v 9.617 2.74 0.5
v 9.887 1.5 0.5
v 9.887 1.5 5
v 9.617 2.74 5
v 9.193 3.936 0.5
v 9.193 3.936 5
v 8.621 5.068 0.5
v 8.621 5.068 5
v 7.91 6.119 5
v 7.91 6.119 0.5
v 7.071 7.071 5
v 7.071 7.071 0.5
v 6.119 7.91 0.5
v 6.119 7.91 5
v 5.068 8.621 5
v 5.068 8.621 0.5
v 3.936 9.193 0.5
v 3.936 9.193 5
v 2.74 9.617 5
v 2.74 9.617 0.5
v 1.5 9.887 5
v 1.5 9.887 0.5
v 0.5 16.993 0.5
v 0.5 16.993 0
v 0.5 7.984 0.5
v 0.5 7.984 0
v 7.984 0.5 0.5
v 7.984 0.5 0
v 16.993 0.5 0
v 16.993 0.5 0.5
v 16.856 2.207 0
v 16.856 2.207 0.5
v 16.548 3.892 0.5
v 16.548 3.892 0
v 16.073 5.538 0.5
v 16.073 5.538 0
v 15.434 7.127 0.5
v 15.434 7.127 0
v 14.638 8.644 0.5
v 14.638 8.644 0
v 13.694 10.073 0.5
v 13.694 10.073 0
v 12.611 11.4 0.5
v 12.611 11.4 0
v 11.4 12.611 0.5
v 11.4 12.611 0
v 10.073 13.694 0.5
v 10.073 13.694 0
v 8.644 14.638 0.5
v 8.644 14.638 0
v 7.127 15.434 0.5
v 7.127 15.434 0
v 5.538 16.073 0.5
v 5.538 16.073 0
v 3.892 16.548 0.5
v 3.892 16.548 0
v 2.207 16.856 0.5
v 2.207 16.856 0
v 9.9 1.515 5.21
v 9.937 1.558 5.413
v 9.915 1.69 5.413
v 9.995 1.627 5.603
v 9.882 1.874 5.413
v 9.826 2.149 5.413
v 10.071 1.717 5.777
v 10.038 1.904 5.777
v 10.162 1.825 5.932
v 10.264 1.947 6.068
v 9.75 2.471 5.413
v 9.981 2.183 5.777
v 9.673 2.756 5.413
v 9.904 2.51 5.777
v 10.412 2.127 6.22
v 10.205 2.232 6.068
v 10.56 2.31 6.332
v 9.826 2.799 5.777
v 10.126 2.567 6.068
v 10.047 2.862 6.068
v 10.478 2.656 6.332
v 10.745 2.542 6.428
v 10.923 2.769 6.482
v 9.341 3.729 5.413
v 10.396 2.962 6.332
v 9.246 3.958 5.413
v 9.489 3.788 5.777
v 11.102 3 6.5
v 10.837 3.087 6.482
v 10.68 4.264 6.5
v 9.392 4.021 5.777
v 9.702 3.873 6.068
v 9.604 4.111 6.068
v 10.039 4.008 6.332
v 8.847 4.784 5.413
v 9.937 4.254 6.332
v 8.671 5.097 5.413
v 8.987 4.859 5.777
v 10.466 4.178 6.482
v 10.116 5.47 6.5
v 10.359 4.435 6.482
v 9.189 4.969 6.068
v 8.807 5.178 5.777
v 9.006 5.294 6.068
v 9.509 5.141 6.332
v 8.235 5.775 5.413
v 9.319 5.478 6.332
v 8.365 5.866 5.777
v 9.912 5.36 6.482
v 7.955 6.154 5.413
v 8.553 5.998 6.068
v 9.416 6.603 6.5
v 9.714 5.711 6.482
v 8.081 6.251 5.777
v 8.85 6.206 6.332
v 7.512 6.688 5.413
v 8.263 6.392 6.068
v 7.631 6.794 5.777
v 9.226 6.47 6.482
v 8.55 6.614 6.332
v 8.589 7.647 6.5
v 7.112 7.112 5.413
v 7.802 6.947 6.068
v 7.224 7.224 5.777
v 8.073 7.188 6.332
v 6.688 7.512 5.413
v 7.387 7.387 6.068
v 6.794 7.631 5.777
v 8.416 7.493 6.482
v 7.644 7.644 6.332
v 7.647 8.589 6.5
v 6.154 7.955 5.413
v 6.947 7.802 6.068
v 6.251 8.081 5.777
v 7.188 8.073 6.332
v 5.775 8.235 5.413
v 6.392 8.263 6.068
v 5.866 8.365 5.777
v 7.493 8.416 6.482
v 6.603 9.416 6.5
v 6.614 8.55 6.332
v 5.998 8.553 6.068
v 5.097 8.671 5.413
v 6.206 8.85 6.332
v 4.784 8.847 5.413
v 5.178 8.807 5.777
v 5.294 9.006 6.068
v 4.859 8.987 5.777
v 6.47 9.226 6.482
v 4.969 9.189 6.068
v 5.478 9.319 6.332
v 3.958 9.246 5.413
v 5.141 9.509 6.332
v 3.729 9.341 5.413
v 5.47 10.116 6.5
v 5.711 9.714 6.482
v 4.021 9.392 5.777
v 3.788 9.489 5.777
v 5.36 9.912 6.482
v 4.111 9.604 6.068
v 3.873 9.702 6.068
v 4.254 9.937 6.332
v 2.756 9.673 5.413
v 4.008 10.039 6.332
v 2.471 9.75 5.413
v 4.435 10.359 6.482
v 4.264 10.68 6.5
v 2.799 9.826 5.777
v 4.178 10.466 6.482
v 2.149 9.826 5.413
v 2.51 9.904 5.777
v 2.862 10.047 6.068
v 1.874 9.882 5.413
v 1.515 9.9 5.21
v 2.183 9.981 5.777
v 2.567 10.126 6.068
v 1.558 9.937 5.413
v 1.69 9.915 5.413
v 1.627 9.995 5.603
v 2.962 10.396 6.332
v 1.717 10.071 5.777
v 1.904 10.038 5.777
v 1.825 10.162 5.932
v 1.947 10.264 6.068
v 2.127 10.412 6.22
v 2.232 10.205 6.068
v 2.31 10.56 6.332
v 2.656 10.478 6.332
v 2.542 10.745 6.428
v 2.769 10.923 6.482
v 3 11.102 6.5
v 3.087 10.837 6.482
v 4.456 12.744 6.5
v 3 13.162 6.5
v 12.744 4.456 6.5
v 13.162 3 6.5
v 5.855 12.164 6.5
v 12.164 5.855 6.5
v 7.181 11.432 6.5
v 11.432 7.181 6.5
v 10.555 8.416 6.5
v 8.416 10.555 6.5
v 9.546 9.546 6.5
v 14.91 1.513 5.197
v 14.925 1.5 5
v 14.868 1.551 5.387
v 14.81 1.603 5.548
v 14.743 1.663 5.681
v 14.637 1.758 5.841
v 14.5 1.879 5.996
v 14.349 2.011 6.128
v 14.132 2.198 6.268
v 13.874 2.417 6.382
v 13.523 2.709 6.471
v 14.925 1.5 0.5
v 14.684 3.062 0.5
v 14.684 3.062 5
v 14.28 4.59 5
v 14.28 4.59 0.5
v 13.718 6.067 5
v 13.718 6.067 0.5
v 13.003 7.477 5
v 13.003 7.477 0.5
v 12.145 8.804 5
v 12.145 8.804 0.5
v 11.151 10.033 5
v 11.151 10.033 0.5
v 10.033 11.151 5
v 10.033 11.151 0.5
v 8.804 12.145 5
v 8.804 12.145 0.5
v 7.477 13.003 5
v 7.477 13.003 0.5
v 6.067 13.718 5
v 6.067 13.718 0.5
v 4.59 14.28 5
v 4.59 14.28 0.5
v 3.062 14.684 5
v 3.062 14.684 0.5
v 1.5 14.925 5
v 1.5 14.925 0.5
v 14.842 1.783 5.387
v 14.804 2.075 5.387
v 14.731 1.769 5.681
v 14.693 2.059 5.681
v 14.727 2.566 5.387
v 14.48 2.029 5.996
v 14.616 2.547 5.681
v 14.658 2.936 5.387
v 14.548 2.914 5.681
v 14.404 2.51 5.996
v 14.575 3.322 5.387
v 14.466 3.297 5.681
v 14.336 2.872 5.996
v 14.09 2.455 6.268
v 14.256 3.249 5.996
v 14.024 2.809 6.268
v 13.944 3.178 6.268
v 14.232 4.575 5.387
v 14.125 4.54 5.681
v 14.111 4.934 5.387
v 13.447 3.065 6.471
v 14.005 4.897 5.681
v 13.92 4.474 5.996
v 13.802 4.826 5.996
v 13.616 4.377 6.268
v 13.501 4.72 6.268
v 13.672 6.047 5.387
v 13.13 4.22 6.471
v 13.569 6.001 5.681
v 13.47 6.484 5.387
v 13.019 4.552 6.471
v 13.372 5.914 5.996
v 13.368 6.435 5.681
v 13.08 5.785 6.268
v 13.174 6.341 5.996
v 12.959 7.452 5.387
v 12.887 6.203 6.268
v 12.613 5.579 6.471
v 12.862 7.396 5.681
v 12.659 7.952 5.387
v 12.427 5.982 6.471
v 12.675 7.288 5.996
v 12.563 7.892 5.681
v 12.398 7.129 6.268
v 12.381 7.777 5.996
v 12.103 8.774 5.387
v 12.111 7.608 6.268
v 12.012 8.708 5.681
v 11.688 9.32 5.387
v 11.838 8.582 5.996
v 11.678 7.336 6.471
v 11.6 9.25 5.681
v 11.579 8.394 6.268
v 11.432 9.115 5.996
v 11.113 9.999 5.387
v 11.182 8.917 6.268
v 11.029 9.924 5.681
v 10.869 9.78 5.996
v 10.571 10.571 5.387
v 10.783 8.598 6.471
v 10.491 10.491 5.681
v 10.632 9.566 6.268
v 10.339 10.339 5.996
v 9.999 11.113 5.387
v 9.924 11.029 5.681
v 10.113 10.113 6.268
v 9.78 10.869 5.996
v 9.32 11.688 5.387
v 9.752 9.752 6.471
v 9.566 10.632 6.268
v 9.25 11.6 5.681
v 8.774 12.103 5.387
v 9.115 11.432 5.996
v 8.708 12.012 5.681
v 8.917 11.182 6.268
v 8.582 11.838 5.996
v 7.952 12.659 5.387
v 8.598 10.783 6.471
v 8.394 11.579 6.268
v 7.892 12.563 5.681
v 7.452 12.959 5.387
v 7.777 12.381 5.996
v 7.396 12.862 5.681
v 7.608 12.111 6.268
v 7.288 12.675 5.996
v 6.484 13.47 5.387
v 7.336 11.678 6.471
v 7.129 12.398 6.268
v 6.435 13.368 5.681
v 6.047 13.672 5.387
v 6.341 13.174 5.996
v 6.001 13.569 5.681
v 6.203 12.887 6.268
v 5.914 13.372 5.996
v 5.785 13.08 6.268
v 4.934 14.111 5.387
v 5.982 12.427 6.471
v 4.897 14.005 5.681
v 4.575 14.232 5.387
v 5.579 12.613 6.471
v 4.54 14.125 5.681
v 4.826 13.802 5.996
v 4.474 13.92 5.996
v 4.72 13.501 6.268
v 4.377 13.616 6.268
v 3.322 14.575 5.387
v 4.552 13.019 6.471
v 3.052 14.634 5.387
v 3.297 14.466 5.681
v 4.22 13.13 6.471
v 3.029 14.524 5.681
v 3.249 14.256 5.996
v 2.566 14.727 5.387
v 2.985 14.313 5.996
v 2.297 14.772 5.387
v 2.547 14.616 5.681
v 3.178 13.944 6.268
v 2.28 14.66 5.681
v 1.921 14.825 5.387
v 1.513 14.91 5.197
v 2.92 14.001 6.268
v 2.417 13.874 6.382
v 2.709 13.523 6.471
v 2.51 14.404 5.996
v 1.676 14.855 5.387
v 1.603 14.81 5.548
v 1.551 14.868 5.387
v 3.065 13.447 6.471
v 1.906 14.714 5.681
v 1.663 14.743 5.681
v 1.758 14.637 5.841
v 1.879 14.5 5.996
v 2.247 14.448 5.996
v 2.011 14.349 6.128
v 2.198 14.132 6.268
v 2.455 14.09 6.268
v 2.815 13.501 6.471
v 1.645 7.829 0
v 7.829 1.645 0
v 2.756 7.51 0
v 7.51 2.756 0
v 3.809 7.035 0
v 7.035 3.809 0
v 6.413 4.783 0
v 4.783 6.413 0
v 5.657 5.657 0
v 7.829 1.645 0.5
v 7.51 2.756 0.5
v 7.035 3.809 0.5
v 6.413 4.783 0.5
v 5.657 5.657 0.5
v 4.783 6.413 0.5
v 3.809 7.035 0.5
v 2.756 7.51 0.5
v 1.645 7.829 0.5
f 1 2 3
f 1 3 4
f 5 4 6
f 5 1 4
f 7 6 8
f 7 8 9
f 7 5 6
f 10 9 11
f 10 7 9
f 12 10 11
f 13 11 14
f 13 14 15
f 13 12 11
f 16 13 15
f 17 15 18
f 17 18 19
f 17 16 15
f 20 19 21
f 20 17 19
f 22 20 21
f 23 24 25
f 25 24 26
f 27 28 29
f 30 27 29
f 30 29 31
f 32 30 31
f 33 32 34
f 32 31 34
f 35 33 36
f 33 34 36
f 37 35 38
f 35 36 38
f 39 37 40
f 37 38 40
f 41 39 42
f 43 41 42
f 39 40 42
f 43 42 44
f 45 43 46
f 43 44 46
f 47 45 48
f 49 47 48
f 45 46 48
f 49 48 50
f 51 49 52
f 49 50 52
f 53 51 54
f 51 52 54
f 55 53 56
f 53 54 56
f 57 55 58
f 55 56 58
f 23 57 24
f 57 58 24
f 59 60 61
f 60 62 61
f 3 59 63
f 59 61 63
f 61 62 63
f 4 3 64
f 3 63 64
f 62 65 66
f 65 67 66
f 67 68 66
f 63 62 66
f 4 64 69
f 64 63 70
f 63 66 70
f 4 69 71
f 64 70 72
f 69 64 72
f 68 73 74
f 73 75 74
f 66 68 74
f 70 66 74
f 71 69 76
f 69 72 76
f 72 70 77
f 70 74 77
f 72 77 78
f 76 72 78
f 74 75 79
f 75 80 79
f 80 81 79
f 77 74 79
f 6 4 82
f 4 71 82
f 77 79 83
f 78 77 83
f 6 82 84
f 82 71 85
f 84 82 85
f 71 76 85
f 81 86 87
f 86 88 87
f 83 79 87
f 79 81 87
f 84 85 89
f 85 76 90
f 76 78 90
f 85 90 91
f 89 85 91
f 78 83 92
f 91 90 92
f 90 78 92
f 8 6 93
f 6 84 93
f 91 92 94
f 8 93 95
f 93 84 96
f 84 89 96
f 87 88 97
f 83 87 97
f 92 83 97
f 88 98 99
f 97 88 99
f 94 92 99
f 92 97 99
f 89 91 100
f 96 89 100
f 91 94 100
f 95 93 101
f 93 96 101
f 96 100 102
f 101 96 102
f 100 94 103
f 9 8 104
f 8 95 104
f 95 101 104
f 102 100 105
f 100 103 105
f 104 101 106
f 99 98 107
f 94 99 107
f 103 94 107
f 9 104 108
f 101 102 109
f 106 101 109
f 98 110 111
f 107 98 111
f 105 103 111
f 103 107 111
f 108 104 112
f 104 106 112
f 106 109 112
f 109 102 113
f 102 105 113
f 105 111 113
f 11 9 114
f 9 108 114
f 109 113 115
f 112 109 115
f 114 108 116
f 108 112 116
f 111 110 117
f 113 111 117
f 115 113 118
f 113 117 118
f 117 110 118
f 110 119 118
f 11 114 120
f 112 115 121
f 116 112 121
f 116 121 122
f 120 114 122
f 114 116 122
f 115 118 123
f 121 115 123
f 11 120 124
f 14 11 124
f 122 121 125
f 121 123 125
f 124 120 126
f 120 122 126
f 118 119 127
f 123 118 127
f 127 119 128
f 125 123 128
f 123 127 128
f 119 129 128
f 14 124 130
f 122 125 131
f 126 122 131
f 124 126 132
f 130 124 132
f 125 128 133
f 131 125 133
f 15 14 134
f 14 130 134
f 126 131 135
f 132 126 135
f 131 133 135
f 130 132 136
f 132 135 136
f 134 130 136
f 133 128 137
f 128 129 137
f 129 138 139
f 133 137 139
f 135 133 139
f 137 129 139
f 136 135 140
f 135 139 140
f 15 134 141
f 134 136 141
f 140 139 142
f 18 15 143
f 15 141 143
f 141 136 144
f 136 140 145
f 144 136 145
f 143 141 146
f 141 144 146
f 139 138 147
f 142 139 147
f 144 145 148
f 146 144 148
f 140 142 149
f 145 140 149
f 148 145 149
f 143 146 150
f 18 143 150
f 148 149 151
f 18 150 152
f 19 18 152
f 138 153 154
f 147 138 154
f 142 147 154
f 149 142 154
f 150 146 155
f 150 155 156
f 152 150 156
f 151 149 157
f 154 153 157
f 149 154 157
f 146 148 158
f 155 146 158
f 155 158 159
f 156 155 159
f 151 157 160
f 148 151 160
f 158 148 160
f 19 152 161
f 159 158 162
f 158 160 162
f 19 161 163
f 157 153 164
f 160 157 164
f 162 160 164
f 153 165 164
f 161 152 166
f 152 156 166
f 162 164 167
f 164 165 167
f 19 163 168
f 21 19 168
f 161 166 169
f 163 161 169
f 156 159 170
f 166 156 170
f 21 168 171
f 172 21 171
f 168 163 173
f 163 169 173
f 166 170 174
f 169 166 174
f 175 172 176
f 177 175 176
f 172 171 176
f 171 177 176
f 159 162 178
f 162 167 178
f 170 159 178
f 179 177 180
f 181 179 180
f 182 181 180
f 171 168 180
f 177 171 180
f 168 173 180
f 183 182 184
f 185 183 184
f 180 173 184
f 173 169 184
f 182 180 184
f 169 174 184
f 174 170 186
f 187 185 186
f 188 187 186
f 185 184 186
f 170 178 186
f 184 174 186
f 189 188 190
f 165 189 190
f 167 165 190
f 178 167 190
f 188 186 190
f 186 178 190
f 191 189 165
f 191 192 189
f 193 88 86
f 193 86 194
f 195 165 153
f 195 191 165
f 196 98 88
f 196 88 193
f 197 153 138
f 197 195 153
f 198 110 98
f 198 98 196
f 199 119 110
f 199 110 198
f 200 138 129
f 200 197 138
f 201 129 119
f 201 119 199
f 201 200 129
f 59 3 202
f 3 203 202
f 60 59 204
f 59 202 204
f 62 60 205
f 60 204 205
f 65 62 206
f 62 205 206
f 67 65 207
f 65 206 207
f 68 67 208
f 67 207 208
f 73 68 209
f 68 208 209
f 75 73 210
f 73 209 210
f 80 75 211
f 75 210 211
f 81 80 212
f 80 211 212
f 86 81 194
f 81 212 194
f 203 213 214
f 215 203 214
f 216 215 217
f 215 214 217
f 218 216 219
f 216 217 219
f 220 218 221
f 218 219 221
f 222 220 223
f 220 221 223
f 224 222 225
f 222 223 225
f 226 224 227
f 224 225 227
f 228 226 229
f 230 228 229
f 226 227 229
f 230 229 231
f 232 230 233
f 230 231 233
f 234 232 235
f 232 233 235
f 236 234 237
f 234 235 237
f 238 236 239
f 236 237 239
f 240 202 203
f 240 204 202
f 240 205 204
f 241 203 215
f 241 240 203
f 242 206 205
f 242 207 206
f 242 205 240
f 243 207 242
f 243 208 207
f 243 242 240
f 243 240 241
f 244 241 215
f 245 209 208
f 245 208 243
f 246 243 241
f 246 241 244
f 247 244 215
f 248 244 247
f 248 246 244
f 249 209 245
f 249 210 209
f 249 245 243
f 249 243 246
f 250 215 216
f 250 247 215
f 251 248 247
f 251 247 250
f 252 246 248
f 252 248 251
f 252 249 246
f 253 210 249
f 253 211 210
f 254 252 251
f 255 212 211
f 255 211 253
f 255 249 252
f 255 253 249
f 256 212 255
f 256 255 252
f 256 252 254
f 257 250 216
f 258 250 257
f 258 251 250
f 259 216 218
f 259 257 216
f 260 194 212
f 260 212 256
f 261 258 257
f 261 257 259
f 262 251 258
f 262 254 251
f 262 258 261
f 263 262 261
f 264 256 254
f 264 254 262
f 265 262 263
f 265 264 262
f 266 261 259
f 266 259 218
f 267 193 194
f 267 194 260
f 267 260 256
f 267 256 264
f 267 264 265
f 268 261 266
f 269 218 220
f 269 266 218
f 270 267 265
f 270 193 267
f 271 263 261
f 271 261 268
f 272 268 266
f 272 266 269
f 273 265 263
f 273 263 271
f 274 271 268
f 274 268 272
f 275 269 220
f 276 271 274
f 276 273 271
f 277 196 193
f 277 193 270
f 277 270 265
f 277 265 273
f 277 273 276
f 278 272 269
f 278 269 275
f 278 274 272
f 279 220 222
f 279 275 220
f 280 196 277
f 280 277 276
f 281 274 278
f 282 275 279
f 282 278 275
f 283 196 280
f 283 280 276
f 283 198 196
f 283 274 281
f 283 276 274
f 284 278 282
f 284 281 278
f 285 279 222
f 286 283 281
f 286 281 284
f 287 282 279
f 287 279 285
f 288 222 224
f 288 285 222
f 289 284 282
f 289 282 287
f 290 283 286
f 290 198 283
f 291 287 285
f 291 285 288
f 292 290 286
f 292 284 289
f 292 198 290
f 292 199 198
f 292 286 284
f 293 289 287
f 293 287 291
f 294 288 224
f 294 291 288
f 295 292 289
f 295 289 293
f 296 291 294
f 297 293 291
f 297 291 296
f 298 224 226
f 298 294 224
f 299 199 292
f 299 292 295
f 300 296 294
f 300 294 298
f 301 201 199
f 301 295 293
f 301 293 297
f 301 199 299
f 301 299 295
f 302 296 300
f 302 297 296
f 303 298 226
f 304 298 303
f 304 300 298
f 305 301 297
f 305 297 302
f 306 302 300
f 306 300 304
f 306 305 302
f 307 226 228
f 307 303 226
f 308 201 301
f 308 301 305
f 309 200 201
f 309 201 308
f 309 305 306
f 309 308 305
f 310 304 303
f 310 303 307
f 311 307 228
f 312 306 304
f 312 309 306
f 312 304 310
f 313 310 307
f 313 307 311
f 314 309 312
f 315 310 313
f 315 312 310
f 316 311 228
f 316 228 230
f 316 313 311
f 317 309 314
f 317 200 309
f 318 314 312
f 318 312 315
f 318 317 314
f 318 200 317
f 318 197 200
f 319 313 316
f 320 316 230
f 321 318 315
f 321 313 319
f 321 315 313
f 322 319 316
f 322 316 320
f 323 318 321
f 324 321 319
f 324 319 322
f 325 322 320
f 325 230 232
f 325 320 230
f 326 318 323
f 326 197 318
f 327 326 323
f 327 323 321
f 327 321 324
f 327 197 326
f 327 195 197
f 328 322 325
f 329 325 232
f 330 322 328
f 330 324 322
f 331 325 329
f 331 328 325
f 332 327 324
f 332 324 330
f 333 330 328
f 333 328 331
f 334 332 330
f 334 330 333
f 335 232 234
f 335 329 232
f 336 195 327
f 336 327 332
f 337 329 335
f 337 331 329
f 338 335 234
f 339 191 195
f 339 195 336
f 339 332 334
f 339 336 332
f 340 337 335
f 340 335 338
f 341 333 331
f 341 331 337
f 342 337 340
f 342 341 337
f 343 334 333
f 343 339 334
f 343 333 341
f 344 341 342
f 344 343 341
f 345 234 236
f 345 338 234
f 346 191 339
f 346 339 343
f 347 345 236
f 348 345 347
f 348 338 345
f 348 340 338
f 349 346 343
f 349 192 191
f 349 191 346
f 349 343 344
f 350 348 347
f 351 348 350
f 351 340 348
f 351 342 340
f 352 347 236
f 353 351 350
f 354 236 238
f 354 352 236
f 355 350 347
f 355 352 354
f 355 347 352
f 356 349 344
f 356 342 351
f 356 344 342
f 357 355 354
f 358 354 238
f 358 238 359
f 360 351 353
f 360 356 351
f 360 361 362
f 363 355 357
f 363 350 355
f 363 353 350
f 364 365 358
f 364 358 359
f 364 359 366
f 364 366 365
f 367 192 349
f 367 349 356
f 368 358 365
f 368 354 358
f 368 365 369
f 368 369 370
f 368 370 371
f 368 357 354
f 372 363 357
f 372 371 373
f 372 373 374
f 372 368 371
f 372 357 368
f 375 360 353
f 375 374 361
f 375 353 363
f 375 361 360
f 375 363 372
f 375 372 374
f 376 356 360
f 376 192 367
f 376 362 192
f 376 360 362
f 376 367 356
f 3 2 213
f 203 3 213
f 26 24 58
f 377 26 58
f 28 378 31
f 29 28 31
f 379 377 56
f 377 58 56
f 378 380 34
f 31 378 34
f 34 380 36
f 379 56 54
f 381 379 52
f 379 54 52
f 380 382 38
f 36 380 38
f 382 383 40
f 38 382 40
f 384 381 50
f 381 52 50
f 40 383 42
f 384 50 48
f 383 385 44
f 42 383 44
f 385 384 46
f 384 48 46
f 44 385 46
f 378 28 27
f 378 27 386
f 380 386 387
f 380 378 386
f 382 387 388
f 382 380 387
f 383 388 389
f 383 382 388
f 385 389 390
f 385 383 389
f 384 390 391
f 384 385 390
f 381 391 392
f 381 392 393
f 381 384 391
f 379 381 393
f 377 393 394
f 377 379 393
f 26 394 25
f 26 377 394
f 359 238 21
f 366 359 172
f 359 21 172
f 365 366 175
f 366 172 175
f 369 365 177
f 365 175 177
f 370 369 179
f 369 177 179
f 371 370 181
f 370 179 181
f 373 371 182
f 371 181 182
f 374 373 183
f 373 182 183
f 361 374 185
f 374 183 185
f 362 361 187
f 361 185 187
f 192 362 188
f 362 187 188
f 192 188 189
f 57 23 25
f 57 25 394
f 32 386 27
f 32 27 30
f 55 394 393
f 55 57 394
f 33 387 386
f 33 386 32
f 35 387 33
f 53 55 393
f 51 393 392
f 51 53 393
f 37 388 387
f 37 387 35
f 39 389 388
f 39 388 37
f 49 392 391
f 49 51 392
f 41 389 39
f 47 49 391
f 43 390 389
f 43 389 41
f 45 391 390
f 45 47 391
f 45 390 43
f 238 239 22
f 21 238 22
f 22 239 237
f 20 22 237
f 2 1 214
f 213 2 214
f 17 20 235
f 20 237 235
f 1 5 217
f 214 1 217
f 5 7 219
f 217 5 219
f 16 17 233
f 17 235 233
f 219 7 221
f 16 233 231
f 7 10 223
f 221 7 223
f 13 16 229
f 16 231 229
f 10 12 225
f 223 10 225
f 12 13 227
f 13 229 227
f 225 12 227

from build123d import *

# Parameters (mm, degrees)
PAD_DEPTH    = 0.5
PAD001_DEPTH = 6
FILLET_R     = 1.5


with BuildPart() as pad:
    # Sketch → Pad (new body)
    with BuildSketch(Plane.XY):
        with BuildLine():
            Line((0.5, 16.992645), (0.5, 7.98436))
            ThreePointArc((7.98436, 0.5), (5.656854, 5.656854), (0.5, 7.98436))
            Line((7.98436, 0.5), (16.992645, 0.5))
            ThreePointArc((16.992645, 0.5), (12.020815, 12.020815), (0.5, 16.992645))
        make_face()
    extrude(amount=PAD_DEPTH)


with BuildPart() as fillet_body:
    # Sketch001 → Pad001 (new body)
    with BuildSketch(Plane.XY.offset(0.5)):
        with BuildLine():
            Line((1.5, 14.924812), (1.5, 9.88686))
            ThreePointArc((9.88686, 1.5), (7.071068, 7.071068), (1.5, 9.88686))
            Line((9.88686, 1.5), (14.924812, 1.5))
            ThreePointArc((14.924812, 1.5), (10.606602, 10.606602), (1.5, 14.924812))
        make_face()
    extrude(amount=PAD001_DEPTH)

    # Fillet
    fillet_edges = [fillet_body.edges().sort_by_distance(p)[0] for p in [
        (7.071068, 7.071068, 6.5),
        (10.606602, 10.606602, 6.5),
        (12.405836, 1.5, 6.5),
        (1.5, 12.405836, 6.5),
    ]]
    fillet(fillet_edges, radius=FILLET_R)


solid = Compound([pad.part, fillet_body.part])
